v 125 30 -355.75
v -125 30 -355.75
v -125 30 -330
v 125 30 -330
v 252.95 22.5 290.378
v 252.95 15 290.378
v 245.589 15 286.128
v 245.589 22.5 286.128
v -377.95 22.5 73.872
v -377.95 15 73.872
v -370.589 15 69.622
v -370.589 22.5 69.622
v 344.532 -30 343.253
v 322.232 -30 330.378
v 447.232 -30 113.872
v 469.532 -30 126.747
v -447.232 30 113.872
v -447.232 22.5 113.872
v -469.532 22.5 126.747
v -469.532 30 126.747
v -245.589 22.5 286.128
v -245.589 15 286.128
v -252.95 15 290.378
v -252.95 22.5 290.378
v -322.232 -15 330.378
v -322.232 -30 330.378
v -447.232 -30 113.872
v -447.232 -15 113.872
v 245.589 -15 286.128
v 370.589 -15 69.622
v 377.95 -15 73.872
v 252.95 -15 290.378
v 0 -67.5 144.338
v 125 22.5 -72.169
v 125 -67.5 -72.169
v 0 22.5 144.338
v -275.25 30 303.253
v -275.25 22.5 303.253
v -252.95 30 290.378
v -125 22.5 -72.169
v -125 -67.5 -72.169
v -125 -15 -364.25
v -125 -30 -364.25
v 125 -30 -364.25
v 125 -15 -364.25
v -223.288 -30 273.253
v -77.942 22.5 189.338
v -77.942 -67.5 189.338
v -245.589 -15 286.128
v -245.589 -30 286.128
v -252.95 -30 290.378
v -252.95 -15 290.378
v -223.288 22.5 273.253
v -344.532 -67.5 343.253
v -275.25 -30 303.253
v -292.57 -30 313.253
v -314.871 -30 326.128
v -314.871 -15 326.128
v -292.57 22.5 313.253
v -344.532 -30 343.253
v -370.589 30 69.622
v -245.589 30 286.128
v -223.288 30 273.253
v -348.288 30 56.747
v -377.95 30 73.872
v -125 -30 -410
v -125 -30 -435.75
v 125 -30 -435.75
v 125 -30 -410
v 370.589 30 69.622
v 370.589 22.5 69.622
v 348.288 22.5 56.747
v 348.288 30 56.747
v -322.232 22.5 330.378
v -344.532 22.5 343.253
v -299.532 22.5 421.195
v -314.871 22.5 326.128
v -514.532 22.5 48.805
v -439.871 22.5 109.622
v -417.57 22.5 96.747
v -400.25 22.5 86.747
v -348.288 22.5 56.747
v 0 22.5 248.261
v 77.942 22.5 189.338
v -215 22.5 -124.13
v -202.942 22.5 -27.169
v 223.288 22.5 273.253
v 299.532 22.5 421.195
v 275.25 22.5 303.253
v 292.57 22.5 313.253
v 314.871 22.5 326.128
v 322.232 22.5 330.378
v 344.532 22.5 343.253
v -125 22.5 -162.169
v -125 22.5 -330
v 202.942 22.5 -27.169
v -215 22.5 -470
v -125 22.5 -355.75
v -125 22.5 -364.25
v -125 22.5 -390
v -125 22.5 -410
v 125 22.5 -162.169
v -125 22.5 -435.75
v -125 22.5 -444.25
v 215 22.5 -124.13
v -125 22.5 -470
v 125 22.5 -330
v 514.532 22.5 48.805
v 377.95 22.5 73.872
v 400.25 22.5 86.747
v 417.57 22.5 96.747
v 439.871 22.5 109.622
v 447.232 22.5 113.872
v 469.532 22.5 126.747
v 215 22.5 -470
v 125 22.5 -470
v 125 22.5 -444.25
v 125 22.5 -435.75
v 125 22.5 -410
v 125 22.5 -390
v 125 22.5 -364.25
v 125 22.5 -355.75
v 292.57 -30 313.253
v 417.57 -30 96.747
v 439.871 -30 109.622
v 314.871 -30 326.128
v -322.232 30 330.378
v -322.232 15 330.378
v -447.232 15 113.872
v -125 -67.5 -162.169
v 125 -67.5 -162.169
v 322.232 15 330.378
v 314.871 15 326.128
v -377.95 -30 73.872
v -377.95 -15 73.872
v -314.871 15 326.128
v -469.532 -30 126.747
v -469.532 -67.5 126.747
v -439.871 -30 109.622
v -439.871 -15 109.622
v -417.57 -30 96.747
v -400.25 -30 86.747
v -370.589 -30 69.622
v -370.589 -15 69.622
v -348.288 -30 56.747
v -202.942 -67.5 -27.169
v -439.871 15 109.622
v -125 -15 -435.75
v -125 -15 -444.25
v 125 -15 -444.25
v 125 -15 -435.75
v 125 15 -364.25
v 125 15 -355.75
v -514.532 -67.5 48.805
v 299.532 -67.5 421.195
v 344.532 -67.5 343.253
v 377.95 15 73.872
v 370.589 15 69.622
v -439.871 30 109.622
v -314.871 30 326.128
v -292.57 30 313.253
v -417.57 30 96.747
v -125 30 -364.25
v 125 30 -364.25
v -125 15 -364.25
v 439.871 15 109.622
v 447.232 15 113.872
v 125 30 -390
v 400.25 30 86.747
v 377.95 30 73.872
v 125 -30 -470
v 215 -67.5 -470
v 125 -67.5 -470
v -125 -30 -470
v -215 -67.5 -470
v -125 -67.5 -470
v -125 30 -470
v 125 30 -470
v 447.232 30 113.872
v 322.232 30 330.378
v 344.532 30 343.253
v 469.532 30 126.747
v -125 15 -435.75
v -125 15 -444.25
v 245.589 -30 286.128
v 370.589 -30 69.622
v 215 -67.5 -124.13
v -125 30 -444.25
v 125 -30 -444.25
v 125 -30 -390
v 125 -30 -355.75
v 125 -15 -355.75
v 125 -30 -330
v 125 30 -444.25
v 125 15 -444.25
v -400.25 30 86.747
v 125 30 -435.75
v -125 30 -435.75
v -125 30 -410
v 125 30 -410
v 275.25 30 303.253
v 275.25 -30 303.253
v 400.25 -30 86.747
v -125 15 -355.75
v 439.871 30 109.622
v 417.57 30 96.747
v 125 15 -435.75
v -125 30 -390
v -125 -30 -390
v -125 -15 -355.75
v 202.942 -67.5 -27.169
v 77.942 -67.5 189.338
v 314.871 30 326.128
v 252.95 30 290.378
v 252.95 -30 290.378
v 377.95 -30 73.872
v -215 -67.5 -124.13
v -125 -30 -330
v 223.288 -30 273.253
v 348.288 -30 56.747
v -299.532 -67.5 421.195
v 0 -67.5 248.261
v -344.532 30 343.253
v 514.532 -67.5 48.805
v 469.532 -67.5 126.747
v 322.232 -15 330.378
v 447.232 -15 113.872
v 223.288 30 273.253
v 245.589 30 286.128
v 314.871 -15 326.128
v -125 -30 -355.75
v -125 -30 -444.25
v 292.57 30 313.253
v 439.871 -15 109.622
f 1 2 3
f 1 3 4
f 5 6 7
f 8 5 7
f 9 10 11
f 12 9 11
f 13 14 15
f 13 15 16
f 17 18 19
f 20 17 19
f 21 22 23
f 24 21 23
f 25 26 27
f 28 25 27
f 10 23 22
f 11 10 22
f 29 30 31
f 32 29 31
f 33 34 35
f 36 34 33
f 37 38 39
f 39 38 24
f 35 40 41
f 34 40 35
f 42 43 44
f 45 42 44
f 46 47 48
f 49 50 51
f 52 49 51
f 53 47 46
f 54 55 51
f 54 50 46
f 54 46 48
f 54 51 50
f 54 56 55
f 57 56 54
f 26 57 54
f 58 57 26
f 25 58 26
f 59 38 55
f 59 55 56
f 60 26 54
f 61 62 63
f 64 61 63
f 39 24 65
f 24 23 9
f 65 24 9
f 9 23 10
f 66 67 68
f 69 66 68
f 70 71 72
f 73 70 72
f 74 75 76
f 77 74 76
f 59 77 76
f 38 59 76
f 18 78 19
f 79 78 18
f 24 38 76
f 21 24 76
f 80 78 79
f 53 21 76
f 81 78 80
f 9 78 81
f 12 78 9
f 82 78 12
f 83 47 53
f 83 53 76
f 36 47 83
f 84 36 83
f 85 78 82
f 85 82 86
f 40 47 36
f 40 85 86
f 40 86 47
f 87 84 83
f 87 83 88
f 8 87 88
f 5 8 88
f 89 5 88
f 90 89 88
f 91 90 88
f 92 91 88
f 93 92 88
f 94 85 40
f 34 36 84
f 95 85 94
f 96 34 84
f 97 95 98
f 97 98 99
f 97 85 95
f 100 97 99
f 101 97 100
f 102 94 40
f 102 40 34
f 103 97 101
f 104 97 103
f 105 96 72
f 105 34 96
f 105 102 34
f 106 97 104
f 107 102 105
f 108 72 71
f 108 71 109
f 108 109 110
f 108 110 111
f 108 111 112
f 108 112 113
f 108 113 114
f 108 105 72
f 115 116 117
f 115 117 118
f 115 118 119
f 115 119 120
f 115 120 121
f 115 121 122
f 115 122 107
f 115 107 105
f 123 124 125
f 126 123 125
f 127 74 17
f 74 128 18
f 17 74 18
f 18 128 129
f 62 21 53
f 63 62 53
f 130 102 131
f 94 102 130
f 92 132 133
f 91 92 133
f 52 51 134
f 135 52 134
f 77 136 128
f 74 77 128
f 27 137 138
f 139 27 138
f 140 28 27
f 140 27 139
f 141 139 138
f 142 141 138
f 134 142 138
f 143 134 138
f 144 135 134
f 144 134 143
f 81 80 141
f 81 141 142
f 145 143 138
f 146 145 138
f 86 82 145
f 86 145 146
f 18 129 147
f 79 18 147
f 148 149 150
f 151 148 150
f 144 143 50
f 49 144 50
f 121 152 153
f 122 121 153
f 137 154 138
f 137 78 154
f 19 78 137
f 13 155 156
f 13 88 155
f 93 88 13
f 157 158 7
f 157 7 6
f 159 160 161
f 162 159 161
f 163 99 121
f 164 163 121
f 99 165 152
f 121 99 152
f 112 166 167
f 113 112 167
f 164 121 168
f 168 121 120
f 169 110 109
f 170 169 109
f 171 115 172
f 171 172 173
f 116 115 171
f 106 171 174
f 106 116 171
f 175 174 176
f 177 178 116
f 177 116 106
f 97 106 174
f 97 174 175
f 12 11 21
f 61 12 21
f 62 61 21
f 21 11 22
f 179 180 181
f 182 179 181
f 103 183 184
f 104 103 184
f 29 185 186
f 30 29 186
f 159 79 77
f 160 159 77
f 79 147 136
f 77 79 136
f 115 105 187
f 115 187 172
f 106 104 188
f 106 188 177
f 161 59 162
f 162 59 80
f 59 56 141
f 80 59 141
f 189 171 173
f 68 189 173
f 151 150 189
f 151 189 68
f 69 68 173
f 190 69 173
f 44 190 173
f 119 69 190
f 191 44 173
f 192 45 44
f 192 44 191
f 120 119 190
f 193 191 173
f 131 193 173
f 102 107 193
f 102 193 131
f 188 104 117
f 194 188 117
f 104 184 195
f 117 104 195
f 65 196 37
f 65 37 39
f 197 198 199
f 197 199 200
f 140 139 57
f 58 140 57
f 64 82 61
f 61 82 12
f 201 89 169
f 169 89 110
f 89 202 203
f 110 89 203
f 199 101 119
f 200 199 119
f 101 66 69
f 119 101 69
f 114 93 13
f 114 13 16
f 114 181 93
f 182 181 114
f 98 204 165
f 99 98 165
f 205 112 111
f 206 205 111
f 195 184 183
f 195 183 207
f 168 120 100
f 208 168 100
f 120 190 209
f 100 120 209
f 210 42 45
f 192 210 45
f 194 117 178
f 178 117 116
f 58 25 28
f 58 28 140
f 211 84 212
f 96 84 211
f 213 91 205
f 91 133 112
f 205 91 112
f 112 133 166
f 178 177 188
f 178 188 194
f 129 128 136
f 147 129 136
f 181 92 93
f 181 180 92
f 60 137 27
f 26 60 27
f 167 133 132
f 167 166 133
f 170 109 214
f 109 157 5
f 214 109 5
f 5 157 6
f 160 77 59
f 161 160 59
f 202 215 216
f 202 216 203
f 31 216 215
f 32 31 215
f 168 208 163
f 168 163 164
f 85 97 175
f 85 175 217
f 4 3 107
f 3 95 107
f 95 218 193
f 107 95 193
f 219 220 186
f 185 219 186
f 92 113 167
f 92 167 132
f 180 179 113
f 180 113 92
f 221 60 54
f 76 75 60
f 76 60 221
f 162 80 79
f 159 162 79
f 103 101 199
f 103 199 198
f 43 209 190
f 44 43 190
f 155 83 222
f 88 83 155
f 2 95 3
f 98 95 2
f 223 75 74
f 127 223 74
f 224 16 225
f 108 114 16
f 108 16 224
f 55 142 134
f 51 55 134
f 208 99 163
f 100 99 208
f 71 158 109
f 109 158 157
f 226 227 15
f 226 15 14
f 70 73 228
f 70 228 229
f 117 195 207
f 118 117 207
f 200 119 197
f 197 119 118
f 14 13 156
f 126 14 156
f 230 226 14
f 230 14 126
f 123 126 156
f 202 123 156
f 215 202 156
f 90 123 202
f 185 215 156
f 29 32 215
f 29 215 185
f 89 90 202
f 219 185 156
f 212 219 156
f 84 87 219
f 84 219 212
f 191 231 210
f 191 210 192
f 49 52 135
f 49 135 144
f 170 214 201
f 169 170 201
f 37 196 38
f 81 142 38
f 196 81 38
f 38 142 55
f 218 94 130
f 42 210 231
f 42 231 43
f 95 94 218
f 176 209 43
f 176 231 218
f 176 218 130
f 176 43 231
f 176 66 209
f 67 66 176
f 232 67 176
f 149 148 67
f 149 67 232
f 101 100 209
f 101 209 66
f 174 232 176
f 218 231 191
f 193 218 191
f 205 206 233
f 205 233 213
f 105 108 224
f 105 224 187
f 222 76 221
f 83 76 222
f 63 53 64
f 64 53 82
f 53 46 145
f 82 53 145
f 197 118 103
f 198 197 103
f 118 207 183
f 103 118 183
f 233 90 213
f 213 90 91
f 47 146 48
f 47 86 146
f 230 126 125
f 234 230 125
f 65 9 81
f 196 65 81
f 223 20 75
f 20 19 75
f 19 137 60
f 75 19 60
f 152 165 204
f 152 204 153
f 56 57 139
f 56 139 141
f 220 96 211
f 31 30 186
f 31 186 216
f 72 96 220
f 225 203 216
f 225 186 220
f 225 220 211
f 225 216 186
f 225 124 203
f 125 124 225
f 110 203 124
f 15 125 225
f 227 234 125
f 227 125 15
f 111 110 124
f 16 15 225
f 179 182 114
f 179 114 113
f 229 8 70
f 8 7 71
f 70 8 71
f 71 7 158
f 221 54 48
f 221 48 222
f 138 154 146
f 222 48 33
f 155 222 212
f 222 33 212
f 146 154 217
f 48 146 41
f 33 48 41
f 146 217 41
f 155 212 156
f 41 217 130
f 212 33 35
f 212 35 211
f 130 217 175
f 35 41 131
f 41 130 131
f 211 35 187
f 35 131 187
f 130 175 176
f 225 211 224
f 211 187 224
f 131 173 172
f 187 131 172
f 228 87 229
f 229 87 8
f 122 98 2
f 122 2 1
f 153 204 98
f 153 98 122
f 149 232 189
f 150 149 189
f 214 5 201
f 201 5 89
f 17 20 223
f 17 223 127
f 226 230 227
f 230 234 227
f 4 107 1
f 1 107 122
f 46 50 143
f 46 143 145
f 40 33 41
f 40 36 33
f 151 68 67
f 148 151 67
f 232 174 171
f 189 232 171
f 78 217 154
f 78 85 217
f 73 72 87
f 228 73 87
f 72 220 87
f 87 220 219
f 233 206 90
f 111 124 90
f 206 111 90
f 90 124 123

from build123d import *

# Parameters (mm, degrees)
SALIENTE_EXTRUIR1_DEPTH   = 15
SALIENTE_EXTRUIR1_2_DEPTH = 15
SALIENTE_EXTRUIR1_3_DEPTH = 15
SALIENTE_EXTRUIR1_4_DEPTH = 15
SALIENTE_EXTRUIR1_5_DEPTH = 15
SALIENTE_EXTRUIR1_6_DEPTH = 15
CROQUIS1_4_W              = 250
CROQUIS1_4_H              = 25.75
SALIENTE_EXTRUIR2_DEPTH   = 30
SALIENTE_EXTRUIR3_DEPTH   = 22.5
SALIENTE_EXTRUIR4_DEPTH   = 67.5


with BuildPart() as part:
    # Croquis1 → Saliente-Extruir1 (new, symmetric)
    with BuildSketch(Plane(origin=(0, 0, 0), x_dir=(1, 0, 0), z_dir=(0, 1, 0))):
        Polygon((-377.949753328, -73.871824527), (-315.449753328, -182.125), (-252.949753328, -290.378175473), (-245.588537396, -286.128175473), (-370.588537396, -69.621824527), align=None)
    extrude(amount=SALIENTE_EXTRUIR1_DEPTH, both=True)



with BuildPart() as body_2:
    # Croquis1 → Saliente-Extruir1 2 (new, symmetric)
    with BuildSketch(Plane(origin=(0, 0, 0), x_dir=(1, 0, 0), z_dir=(0, 1, 0))):
        Polygon((-314.870569699, -326.128175473), (-377.370569699, -217.875), (-439.870569699, -109.621824527), (-447.231785631, -113.871824527), (-322.231785631, -330.378175473), align=None)
    extrude(amount=SALIENTE_EXTRUIR1_2_DEPTH, both=True)


with BuildPart() as body_3:
    # Croquis1 → Saliente-Extruir1 3 (new, symmetric)
    with BuildSketch(Plane(origin=(0, 0, 0), x_dir=(1, 0, 0), z_dir=(0, 1, 0))):
        Polygon((-125, 364.25), (-125, 355.75), (125, 355.75), (125, 364.25), (0, 364.25), align=None)
    extrude(amount=SALIENTE_EXTRUIR1_3_DEPTH, both=True)


with BuildPart() as body_4:
    # Croquis1 → Saliente-Extruir1 4 (new, symmetric)
    with BuildSketch(Plane(origin=(0, 0, 0), x_dir=(1, 0, 0), z_dir=(0, 1, 0))):
        Polygon((370.588537396, -69.621824527), (245.588537396, -286.128175473), (252.949753328, -290.378175473), (315.449753328, -182.125), (377.949753328, -73.871824527), align=None)
    extrude(amount=SALIENTE_EXTRUIR1_4_DEPTH, both=True)


with BuildPart() as body_5:
    # Croquis1 → Saliente-Extruir1 5 (new, symmetric)
    with BuildSketch(Plane(origin=(0, 0, 0), x_dir=(1, 0, 0), z_dir=(0, 1, 0))):
        Polygon((-125, 444.25), (-125, 435.75), (0, 435.75), (125, 435.75), (125, 444.25), align=None)
    extrude(amount=SALIENTE_EXTRUIR1_5_DEPTH, both=True)


with BuildPart() as body_6:
    # Croquis1 → Saliente-Extruir1 6 (new, symmetric)
    with BuildSketch(Plane(origin=(0, 0, 0), x_dir=(1, 0, 0), z_dir=(0, 1, 0))):
        Polygon((377.370569699, -217.875), (314.870569699, -326.128175473), (322.231785631, -330.378175473), (447.231785631, -113.871824527), (439.870569699, -109.621824527), align=None)
    extrude(amount=SALIENTE_EXTRUIR1_6_DEPTH, both=True)


with BuildPart() as part_1:
    add(part.part)

    add(body_2.part)  # Saliente-Extruir2 merges body 2

    add(body_3.part)  # Saliente-Extruir2 merges body 3

    add(body_4.part)  # Saliente-Extruir2 merges body 4

    add(body_5.part)  # Saliente-Extruir2 merges body 5

    add(body_6.part)  # Saliente-Extruir2 merges body 6
    # Croquis1<4> → Saliente-Extruir2 (add, symmetric)
    with BuildSketch(Plane(origin=(0, 0, 0), x_dir=(1, 0, 0), z_dir=(0, 1, 0))):
        Polygon((-252.949753328, -290.378175473), (-377.949753328, -73.871824527), (-400.249907476, -86.746824527), (-275.249907476, -303.253175473), align=None)
        Polygon((-292.570415552, -313.253175473), (-417.570415552, -96.746824527), (-439.870569699, -109.621824527), (-314.870569699, -326.128175473), align=None)
        Polygon((-348.288383249, -56.746824527), (-370.588537396, -69.621824527), (-245.588537396, -286.128175473), (-223.288383249, -273.253175473), align=None)
        Polygon((-322.231785631, -330.378175473), (-447.231785631, -113.871824527), (-469.531939779, -126.746824527), (-344.531939779, -343.253175473), align=None)
        with Locations((0, 342.875)):
            Rectangle(CROQUIS1_4_W, CROQUIS1_4_H)
        Polygon((348.288383249, -56.746824527), (223.288383249, -273.253175473), (245.588537396, -286.128175473), (370.588537396, -69.621824527), align=None)
        with Locations((0, 377.125)):
            Rectangle(CROQUIS1_4_W, CROQUIS1_4_H)
        Polygon((252.949753328, -290.378175473), (275.249907476, -303.253175473), (400.249907476, -86.746824527), (377.949753328, -73.871824527), align=None)
        with Locations((0, 422.875)):
            Rectangle(CROQUIS1_4_W, CROQUIS1_4_H)
        Polygon((292.570415552, -313.253175473), (314.870569699, -326.128175473), (439.870569699, -109.621824527), (417.570415552, -96.746824527), align=None)
        with Locations((0, 457.125)):
            Rectangle(CROQUIS1_4_W, CROQUIS1_4_H)
        Polygon((322.231785631, -330.378175473), (344.531939779, -343.253175473), (469.531939779, -126.746824527), (447.231785631, -113.871824527), align=None)
    extrude(amount=SALIENTE_EXTRUIR2_DEPTH, both=True)

    # Croquis1<5> → Saliente-Extruir3 (add)
    with BuildSketch(Plane(origin=(0, 0, 0), x_dir=(1, 0, 0), z_dir=(0, 1, 0))):
        Polygon((-202.942286341, 27.168783649), (-77.942286341, -189.337567297), (-344.531939779, -343.253175473), (-299.531939779, -421.195461814), (0, -248.260615752), (299.531939779, -421.195461814), (344.531939779, -343.253175473), (77.942286341, -189.337567297), (202.942286341, 27.168783649), (469.531939779, -126.746824527), (514.531939779, -48.804538186), (215, 124.130307876), (215, 470), (125, 470), (125, 162.168783649), (-125, 162.168783649), (-125, 470), (-215, 470), (-215, 124.130307876), (-514.531939779, -48.804538186), (-469.531939779, -126.746824527), align=None)
        Polygon((-125, 72.168783649), (125, 72.168783649), (0, -144.337567297), align=None, mode=Mode.SUBTRACT)
    extrude(amount=SALIENTE_EXTRUIR3_DEPTH)

    # Croquis1<6> → Saliente-Extruir4 (add)
    with BuildSketch(Plane(origin=(0, 0, 0), x_dir=(1, 0, 0), z_dir=(0, 1, 0))):
        Polygon((-202.942286341, 27.168783649), (-77.942286341, -189.337567297), (-344.531939779, -343.253175473), (-299.531939779, -421.195461814), (0, -248.260615752), (299.531939779, -421.195461814), (344.531939779, -343.253175473), (77.942286341, -189.337567297), (202.942286341, 27.168783649), (469.531939779, -126.746824527), (514.531939779, -48.804538186), (215, 124.130307876), (215, 470), (125, 470), (125, 162.168783649), (-125, 162.168783649), (-125, 470), (-215, 470), (-215, 124.130307876), (-514.531939779, -48.804538186), (-469.531939779, -126.746824527), align=None)
        Polygon((-125, 72.168783649), (125, 72.168783649), (0, -144.337567297), align=None, mode=Mode.SUBTRACT)
    extrude(amount=-SALIENTE_EXTRUIR4_DEPTH)


solid = part_1.part
